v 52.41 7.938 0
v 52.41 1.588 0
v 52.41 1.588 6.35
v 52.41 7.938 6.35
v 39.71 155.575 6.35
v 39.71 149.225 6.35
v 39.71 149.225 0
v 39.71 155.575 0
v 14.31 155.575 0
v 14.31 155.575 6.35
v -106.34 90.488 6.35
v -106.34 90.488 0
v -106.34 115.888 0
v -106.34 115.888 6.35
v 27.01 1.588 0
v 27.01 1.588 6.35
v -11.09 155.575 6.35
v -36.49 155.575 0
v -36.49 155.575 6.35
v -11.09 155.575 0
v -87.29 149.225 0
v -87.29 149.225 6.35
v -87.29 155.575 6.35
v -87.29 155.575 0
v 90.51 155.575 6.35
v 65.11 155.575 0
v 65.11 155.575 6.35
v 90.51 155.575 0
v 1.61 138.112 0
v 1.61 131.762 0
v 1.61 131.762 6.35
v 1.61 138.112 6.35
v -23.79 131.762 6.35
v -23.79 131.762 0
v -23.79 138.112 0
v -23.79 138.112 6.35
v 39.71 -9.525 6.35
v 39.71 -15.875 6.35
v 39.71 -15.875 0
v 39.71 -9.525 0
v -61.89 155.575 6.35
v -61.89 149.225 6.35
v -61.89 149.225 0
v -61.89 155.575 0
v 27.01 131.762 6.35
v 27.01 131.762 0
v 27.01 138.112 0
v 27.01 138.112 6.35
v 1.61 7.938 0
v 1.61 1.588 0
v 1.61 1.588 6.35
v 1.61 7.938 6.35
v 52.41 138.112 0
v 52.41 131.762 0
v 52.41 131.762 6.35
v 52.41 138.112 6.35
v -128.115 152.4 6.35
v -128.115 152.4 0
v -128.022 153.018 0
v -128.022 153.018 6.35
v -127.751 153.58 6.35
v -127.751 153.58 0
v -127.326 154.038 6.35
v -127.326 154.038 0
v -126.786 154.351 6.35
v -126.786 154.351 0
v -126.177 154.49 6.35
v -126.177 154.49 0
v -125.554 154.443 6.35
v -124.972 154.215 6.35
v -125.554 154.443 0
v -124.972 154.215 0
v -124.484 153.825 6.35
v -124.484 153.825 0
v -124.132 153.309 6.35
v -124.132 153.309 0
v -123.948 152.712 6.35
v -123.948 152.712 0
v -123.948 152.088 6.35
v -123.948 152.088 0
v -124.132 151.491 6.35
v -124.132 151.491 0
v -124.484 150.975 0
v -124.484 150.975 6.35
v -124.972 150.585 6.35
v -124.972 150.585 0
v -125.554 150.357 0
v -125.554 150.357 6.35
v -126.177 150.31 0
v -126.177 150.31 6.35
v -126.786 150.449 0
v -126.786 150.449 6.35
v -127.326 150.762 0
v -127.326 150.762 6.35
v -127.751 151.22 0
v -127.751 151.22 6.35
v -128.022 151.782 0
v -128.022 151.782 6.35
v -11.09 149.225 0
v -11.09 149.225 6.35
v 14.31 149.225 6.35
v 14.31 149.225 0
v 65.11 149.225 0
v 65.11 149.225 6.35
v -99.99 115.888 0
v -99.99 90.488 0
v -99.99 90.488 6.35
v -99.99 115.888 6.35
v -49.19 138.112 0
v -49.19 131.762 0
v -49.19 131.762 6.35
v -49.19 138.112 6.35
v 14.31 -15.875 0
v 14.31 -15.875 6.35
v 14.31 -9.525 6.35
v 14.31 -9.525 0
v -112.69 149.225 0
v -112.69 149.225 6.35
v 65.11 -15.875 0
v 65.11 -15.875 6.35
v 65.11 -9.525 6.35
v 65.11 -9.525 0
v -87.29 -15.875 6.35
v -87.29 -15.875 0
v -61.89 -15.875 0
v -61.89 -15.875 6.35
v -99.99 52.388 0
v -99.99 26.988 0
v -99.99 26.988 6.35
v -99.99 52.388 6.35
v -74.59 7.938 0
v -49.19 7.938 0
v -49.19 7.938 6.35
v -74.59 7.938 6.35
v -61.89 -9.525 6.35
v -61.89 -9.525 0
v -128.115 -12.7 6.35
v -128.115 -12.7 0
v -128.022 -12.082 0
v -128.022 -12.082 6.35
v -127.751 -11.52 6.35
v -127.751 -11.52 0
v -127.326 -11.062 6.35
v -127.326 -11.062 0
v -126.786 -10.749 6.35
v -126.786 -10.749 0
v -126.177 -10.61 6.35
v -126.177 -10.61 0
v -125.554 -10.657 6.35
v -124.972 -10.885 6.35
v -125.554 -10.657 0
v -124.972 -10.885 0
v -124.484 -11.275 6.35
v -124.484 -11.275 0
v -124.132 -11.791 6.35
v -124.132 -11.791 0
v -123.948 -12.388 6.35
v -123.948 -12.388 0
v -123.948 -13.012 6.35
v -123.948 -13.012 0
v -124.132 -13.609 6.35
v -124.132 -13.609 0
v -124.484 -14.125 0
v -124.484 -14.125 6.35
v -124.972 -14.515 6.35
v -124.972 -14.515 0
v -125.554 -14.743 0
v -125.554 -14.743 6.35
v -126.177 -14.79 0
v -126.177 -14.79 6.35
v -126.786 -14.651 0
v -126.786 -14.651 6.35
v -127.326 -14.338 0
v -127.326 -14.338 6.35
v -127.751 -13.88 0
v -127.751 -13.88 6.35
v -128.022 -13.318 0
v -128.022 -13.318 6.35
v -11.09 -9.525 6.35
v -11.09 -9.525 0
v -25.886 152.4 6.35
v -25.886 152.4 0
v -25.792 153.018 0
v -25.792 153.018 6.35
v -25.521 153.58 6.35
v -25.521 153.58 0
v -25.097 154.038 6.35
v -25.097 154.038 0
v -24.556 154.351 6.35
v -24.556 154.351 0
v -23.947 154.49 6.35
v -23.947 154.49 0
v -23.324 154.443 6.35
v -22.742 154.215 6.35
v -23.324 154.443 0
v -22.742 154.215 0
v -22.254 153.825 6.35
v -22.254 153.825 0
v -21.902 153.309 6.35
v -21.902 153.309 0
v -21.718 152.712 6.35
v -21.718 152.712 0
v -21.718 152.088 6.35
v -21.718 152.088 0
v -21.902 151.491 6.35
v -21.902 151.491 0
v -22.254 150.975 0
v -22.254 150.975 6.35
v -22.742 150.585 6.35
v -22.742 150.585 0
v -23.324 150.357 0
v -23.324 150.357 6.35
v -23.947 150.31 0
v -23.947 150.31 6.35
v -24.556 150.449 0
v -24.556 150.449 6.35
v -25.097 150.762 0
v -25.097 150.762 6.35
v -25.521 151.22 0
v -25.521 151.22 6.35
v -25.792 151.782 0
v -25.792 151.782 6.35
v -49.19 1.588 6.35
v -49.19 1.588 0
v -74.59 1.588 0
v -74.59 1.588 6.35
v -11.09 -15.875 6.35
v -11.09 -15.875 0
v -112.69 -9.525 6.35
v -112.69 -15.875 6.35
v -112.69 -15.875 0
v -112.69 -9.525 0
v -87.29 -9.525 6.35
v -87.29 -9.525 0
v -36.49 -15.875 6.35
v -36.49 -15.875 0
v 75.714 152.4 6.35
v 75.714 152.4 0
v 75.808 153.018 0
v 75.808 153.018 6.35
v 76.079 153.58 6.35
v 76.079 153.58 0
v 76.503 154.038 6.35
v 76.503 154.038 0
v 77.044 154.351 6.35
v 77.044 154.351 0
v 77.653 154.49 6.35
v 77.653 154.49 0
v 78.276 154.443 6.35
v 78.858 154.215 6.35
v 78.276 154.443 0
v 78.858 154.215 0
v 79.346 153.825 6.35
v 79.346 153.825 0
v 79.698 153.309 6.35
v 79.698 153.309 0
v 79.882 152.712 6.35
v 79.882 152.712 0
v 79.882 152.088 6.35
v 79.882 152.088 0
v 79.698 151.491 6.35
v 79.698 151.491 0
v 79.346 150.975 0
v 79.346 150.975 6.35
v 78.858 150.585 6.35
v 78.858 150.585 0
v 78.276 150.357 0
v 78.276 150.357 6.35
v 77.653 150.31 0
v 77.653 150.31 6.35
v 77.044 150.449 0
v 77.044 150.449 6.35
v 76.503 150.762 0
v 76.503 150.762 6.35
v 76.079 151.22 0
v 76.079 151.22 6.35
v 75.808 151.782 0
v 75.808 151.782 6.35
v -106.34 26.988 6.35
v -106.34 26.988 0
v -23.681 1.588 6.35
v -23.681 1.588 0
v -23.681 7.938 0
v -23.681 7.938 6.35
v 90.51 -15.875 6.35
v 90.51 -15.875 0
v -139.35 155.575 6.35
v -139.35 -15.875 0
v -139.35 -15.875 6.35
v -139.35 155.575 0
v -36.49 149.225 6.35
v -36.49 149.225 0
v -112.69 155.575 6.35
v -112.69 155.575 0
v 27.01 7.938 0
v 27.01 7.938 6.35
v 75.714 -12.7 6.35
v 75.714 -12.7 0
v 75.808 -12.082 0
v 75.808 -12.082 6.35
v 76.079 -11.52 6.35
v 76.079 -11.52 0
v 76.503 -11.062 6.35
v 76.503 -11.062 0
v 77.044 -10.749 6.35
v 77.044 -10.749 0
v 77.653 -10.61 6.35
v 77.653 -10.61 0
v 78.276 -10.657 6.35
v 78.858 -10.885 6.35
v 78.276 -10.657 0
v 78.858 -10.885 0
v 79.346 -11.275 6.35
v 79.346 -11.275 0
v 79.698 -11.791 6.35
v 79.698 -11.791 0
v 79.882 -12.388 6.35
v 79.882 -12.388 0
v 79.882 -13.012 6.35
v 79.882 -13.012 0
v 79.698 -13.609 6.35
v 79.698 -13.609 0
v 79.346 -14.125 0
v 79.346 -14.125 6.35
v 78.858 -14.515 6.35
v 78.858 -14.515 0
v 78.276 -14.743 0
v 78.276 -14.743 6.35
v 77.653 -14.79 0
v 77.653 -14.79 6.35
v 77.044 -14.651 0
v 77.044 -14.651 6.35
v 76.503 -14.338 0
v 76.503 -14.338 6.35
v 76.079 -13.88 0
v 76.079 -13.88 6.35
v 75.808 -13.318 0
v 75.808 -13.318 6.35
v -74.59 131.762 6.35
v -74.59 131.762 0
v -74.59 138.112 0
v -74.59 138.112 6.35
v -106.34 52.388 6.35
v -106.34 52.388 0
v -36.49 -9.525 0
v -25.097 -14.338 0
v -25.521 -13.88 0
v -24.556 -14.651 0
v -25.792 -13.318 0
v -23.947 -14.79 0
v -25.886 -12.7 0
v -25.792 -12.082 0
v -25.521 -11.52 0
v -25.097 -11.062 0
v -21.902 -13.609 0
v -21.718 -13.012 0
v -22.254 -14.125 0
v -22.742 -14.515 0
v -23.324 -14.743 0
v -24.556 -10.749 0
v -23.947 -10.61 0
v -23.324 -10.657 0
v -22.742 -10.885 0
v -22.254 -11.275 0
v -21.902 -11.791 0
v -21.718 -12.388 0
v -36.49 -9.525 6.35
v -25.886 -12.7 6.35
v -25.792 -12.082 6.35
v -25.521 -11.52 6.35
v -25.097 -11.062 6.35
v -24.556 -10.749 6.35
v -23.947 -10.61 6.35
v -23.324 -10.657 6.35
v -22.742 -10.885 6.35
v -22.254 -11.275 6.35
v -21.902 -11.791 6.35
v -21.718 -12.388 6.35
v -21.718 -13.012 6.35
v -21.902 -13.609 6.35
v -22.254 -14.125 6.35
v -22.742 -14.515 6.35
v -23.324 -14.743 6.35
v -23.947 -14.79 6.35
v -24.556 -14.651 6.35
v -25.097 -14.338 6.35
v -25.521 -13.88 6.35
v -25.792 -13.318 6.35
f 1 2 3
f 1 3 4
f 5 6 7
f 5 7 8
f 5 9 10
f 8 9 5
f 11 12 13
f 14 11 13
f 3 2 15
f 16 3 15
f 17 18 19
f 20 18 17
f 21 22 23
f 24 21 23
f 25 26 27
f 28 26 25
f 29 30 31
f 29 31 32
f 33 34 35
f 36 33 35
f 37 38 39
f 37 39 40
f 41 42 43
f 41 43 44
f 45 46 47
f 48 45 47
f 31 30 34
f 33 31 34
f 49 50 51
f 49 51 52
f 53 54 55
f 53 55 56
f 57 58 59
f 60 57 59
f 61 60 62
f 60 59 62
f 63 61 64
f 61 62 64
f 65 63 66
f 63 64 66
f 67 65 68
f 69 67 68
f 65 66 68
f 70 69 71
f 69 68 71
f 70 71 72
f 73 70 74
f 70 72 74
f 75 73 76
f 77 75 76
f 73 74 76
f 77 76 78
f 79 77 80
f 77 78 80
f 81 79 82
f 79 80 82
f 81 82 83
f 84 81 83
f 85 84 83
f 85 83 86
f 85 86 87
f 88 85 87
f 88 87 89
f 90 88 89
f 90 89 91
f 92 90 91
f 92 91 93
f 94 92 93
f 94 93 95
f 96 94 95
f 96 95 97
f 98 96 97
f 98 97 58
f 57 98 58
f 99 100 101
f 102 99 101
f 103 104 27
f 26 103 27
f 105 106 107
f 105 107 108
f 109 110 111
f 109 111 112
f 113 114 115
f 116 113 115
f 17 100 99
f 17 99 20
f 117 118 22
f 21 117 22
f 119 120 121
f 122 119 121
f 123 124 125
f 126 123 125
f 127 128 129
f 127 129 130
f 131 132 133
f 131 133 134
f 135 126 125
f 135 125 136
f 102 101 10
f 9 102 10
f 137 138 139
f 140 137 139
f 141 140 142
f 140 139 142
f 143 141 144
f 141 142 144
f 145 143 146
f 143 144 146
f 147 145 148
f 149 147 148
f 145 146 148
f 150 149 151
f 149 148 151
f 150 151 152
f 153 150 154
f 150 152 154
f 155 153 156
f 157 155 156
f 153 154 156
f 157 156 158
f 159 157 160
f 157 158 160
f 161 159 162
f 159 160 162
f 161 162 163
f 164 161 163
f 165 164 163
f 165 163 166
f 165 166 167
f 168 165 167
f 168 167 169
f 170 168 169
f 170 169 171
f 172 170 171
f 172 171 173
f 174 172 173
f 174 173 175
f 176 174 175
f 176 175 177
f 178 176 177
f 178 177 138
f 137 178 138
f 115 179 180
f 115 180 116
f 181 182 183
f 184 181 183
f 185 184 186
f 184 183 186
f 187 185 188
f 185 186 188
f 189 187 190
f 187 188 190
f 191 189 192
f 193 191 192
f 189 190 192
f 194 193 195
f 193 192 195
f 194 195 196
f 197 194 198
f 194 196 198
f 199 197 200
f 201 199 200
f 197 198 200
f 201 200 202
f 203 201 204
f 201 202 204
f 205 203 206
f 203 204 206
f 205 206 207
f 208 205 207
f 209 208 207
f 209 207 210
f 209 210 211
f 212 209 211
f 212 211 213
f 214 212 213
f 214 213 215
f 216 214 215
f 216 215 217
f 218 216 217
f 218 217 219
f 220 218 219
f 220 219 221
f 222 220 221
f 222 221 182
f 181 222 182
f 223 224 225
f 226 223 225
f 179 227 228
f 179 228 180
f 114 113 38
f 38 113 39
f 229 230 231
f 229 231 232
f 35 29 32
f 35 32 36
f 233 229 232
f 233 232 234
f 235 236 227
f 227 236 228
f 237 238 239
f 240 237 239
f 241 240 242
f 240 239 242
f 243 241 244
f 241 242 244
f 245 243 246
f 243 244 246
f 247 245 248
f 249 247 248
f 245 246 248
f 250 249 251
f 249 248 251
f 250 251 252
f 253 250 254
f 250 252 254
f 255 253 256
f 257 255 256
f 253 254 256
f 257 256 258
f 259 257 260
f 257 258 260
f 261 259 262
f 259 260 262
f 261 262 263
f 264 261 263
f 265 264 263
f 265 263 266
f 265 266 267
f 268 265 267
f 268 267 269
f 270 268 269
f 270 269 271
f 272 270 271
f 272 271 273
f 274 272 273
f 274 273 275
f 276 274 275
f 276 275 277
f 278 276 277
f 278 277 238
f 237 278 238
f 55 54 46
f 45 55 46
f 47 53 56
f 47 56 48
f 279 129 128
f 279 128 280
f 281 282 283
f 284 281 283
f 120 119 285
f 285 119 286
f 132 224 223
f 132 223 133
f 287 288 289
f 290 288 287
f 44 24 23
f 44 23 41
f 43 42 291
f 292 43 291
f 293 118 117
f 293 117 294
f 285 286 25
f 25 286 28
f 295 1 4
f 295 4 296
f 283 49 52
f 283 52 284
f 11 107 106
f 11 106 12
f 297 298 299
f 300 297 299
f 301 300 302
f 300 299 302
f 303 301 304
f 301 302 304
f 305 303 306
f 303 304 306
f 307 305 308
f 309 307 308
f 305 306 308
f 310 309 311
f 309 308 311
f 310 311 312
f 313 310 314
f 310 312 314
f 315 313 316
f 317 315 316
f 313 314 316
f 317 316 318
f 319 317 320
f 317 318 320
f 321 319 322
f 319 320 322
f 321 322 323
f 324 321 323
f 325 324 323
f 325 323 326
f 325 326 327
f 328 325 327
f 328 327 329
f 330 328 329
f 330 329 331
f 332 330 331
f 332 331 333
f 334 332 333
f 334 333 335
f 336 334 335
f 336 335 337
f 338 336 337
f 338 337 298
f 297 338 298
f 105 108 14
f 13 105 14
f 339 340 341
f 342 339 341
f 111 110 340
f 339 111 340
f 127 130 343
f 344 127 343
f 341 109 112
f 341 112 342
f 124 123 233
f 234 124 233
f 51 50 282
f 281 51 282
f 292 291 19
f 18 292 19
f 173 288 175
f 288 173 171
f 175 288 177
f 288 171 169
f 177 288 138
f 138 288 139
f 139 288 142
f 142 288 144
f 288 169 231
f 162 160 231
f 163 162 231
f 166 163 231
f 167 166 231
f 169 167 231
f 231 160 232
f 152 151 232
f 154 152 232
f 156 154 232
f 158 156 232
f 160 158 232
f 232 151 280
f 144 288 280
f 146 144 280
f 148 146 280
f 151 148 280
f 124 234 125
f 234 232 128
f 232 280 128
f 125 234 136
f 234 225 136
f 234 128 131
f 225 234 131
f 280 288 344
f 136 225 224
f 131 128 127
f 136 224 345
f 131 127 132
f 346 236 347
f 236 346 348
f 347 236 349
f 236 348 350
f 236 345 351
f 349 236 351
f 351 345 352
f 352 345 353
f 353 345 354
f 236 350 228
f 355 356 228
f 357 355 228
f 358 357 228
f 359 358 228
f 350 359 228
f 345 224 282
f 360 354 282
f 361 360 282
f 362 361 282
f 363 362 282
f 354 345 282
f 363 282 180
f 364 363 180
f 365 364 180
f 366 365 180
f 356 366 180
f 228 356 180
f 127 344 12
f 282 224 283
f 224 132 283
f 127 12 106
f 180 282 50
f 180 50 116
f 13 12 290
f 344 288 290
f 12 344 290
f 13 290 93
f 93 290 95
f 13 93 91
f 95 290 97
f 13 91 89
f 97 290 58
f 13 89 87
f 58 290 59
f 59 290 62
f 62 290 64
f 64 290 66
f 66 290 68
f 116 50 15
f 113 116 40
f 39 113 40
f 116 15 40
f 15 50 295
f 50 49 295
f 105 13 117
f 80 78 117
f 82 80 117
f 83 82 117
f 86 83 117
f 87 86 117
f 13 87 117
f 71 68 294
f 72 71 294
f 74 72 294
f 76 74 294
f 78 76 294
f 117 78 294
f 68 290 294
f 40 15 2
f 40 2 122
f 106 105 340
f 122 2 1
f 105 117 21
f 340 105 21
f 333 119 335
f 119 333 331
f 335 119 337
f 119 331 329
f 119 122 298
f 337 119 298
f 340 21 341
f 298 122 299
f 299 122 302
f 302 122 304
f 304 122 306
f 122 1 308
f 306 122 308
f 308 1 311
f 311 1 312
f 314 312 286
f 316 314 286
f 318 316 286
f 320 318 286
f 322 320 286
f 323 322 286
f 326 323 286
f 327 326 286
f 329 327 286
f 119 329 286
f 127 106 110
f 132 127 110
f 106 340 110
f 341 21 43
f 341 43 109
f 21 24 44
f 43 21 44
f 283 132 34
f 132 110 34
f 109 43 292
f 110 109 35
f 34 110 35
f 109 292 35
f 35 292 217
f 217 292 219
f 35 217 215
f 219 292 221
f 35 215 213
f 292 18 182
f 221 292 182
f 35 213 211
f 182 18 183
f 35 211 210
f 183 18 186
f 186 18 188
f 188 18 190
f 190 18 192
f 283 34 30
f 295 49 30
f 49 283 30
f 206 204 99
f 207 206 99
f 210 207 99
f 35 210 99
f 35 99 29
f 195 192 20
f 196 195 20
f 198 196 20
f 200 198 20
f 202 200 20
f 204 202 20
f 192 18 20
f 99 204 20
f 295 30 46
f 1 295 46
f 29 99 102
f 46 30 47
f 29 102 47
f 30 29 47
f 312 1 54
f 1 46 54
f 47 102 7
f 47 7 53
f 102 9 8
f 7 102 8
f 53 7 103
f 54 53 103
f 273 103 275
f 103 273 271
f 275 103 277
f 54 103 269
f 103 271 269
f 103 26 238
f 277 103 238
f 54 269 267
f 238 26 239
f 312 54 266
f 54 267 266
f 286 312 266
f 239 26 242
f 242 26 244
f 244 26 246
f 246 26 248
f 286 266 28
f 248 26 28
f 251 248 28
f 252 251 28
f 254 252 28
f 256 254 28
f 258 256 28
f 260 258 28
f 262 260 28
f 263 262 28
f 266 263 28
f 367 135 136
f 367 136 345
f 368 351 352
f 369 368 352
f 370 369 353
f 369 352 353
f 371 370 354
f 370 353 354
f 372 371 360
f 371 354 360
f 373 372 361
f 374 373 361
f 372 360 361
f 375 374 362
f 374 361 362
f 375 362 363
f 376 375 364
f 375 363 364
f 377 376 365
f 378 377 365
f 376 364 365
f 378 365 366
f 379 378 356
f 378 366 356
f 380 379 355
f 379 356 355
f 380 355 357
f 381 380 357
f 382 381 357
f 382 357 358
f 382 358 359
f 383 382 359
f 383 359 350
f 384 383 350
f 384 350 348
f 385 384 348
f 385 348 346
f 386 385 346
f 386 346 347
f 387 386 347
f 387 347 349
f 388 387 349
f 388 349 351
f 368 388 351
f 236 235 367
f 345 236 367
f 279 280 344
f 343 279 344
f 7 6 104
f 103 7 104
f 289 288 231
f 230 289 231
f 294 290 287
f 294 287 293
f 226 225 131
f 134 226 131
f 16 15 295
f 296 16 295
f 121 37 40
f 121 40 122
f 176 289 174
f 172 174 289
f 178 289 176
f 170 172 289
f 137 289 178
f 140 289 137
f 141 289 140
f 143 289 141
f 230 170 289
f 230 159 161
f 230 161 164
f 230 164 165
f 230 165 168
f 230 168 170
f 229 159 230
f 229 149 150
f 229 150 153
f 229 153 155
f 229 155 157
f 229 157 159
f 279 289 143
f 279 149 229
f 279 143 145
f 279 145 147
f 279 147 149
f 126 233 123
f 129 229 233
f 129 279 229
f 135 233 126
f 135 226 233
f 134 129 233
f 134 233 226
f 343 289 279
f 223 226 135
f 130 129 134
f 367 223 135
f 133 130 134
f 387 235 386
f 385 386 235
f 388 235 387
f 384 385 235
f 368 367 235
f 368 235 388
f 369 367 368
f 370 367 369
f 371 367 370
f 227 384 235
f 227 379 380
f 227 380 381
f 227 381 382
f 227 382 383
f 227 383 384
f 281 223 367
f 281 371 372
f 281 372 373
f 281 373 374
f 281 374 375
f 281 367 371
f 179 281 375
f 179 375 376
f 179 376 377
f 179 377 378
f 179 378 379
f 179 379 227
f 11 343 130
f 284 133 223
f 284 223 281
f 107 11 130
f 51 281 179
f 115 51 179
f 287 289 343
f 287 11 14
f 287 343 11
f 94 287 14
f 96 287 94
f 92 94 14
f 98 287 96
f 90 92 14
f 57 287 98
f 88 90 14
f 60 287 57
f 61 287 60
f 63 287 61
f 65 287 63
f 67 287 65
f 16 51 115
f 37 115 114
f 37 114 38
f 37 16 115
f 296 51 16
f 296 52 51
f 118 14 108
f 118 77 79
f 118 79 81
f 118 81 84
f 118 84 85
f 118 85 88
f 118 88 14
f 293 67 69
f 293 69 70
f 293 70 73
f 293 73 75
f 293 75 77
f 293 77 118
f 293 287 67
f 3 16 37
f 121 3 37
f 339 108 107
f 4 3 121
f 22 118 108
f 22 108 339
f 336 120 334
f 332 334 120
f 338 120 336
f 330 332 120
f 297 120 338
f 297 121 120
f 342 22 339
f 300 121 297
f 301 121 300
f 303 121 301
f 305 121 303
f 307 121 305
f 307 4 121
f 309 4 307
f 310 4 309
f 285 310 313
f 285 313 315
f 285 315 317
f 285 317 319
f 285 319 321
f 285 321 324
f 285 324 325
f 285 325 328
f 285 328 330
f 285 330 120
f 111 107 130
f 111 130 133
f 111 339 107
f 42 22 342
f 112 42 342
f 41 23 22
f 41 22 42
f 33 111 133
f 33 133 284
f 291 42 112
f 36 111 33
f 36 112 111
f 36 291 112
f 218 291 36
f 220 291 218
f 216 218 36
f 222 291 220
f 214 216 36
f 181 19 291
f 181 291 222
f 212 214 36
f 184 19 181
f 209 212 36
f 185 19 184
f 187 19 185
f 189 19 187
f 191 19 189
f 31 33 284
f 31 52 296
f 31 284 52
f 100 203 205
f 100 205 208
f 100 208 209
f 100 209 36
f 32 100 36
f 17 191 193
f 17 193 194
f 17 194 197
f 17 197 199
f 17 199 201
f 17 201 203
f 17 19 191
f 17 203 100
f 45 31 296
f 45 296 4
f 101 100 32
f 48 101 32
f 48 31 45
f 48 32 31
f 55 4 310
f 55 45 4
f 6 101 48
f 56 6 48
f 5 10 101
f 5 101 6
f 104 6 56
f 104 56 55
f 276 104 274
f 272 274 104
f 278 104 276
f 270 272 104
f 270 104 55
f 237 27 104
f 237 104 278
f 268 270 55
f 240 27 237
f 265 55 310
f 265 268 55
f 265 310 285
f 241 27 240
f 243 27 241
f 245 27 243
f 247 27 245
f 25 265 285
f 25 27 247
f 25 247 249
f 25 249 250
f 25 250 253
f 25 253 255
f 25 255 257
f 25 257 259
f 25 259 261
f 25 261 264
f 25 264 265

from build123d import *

# Parameters (mm, degrees)
SKETCH1_W           = 229.859874896
SKETCH1_H           = 171.45
BOSS_EXTRUDE1_DEPTH = 6.35
SKETCH2_W           = 25.4
SKETCH2_H           = 6.35
CUT_EXTRUDE1_DEPTH  = 6.35
LPATTERN1_COUNT     = 4
LPATTERN1_PITCH     = 50.8
SKETCH4_R           = 2.0955
CUT_EXTRUDE2_DEPTH  = 209.955242778
SKETCH5_W           = 25.4
SKETCH5_H           = 6.35
SKETCH5_W_2         = 25.290516307
SKETCH5_W_3         = 6.35
SKETCH5_H_2         = 25.4
CUT_EXTRUDE3_DEPTH  = 6.35


with BuildPart() as part:
    # Sketch1 → Boss-Extrude1 (new body)
    with BuildSketch(Plane.XY):
        with Locations((-24.419947229, 69.85)):
            Rectangle(SKETCH1_W, SKETCH1_H)
    extrude(amount=BOSS_EXTRUDE1_DEPTH)

    # Sketch2 → Cut-Extrude1 (cut)
    with BuildSketch(Plane.XY.offset(6.35)):
        with Locations((-99.990009781, -12.7)):
            Rectangle(SKETCH2_W, SKETCH2_H)
        with Locations((-99.990009781, 152.4)):
            Rectangle(SKETCH2_W, SKETCH2_H)
    cut_extrude1 = extrude(amount=-CUT_EXTRUDE1_DEPTH, mode=Mode.SUBTRACT)

    # LPattern1: Cut-Extrude1 ×4
    with Locations(*[(i * LPATTERN1_PITCH, 0, 0) for i in range(1, LPATTERN1_COUNT)]):
        add(cut_extrude1, mode=Mode.SUBTRACT)

    # Sketch4 → Cut-Extrude2 (cut, through all)
    with BuildSketch(Plane(origin=(0, 0, 0), x_dir=(-1, 0, 0), z_dir=(0, 0, -1))):
        with Locations((-77.809990219, -12.7)):
            Circle(SKETCH4_R)
        with Locations((23.790009781, -12.7)):
            Circle(SKETCH4_R)
        with Locations((126.019947229, -12.7)):
            Circle(SKETCH4_R)
        with Locations((126.019947229, 152.4)):
            Circle(SKETCH4_R)
        with Locations((23.790009781, 152.4)):
            Circle(SKETCH4_R)
        with Locations((-77.809990219, 152.4)):
            Circle(SKETCH4_R)
    extrude(amount=-CUT_EXTRUDE2_DEPTH, mode=Mode.SUBTRACT)

    # Sketch5 → Cut-Extrude3 (cut)
    with BuildSketch(Plane(origin=(0, 0, 0), x_dir=(-1, 0, 0), z_dir=(0, 0, -1))):
        with Locations((-39.709990219, 4.7625)):
            Rectangle(SKETCH5_W, SKETCH5_H)
        with Locations((11.035267935, 4.7625)):
            Rectangle(SKETCH5_W_2, SKETCH5_H)
        with Locations((61.890009781, 4.7625)):
            Rectangle(SKETCH5_W, SKETCH5_H)
        with Locations((103.165009781, 39.6875)):
            Rectangle(SKETCH5_W_3, SKETCH5_H_2)
        with Locations((103.165009781, 103.1875)):
            Rectangle(SKETCH5_W_3, SKETCH5_H_2)
        with Locations((61.890009781, 134.9375)):
            Rectangle(SKETCH5_W, SKETCH5_H)
        with Locations((11.090009781, 134.9375)):
            Rectangle(SKETCH5_W, SKETCH5_H)
        with Locations((-39.709990219, 134.9375)):
            Rectangle(SKETCH5_W, SKETCH5_H)
    extrude(amount=-CUT_EXTRUDE3_DEPTH, mode=Mode.SUBTRACT)


solid = part.part
